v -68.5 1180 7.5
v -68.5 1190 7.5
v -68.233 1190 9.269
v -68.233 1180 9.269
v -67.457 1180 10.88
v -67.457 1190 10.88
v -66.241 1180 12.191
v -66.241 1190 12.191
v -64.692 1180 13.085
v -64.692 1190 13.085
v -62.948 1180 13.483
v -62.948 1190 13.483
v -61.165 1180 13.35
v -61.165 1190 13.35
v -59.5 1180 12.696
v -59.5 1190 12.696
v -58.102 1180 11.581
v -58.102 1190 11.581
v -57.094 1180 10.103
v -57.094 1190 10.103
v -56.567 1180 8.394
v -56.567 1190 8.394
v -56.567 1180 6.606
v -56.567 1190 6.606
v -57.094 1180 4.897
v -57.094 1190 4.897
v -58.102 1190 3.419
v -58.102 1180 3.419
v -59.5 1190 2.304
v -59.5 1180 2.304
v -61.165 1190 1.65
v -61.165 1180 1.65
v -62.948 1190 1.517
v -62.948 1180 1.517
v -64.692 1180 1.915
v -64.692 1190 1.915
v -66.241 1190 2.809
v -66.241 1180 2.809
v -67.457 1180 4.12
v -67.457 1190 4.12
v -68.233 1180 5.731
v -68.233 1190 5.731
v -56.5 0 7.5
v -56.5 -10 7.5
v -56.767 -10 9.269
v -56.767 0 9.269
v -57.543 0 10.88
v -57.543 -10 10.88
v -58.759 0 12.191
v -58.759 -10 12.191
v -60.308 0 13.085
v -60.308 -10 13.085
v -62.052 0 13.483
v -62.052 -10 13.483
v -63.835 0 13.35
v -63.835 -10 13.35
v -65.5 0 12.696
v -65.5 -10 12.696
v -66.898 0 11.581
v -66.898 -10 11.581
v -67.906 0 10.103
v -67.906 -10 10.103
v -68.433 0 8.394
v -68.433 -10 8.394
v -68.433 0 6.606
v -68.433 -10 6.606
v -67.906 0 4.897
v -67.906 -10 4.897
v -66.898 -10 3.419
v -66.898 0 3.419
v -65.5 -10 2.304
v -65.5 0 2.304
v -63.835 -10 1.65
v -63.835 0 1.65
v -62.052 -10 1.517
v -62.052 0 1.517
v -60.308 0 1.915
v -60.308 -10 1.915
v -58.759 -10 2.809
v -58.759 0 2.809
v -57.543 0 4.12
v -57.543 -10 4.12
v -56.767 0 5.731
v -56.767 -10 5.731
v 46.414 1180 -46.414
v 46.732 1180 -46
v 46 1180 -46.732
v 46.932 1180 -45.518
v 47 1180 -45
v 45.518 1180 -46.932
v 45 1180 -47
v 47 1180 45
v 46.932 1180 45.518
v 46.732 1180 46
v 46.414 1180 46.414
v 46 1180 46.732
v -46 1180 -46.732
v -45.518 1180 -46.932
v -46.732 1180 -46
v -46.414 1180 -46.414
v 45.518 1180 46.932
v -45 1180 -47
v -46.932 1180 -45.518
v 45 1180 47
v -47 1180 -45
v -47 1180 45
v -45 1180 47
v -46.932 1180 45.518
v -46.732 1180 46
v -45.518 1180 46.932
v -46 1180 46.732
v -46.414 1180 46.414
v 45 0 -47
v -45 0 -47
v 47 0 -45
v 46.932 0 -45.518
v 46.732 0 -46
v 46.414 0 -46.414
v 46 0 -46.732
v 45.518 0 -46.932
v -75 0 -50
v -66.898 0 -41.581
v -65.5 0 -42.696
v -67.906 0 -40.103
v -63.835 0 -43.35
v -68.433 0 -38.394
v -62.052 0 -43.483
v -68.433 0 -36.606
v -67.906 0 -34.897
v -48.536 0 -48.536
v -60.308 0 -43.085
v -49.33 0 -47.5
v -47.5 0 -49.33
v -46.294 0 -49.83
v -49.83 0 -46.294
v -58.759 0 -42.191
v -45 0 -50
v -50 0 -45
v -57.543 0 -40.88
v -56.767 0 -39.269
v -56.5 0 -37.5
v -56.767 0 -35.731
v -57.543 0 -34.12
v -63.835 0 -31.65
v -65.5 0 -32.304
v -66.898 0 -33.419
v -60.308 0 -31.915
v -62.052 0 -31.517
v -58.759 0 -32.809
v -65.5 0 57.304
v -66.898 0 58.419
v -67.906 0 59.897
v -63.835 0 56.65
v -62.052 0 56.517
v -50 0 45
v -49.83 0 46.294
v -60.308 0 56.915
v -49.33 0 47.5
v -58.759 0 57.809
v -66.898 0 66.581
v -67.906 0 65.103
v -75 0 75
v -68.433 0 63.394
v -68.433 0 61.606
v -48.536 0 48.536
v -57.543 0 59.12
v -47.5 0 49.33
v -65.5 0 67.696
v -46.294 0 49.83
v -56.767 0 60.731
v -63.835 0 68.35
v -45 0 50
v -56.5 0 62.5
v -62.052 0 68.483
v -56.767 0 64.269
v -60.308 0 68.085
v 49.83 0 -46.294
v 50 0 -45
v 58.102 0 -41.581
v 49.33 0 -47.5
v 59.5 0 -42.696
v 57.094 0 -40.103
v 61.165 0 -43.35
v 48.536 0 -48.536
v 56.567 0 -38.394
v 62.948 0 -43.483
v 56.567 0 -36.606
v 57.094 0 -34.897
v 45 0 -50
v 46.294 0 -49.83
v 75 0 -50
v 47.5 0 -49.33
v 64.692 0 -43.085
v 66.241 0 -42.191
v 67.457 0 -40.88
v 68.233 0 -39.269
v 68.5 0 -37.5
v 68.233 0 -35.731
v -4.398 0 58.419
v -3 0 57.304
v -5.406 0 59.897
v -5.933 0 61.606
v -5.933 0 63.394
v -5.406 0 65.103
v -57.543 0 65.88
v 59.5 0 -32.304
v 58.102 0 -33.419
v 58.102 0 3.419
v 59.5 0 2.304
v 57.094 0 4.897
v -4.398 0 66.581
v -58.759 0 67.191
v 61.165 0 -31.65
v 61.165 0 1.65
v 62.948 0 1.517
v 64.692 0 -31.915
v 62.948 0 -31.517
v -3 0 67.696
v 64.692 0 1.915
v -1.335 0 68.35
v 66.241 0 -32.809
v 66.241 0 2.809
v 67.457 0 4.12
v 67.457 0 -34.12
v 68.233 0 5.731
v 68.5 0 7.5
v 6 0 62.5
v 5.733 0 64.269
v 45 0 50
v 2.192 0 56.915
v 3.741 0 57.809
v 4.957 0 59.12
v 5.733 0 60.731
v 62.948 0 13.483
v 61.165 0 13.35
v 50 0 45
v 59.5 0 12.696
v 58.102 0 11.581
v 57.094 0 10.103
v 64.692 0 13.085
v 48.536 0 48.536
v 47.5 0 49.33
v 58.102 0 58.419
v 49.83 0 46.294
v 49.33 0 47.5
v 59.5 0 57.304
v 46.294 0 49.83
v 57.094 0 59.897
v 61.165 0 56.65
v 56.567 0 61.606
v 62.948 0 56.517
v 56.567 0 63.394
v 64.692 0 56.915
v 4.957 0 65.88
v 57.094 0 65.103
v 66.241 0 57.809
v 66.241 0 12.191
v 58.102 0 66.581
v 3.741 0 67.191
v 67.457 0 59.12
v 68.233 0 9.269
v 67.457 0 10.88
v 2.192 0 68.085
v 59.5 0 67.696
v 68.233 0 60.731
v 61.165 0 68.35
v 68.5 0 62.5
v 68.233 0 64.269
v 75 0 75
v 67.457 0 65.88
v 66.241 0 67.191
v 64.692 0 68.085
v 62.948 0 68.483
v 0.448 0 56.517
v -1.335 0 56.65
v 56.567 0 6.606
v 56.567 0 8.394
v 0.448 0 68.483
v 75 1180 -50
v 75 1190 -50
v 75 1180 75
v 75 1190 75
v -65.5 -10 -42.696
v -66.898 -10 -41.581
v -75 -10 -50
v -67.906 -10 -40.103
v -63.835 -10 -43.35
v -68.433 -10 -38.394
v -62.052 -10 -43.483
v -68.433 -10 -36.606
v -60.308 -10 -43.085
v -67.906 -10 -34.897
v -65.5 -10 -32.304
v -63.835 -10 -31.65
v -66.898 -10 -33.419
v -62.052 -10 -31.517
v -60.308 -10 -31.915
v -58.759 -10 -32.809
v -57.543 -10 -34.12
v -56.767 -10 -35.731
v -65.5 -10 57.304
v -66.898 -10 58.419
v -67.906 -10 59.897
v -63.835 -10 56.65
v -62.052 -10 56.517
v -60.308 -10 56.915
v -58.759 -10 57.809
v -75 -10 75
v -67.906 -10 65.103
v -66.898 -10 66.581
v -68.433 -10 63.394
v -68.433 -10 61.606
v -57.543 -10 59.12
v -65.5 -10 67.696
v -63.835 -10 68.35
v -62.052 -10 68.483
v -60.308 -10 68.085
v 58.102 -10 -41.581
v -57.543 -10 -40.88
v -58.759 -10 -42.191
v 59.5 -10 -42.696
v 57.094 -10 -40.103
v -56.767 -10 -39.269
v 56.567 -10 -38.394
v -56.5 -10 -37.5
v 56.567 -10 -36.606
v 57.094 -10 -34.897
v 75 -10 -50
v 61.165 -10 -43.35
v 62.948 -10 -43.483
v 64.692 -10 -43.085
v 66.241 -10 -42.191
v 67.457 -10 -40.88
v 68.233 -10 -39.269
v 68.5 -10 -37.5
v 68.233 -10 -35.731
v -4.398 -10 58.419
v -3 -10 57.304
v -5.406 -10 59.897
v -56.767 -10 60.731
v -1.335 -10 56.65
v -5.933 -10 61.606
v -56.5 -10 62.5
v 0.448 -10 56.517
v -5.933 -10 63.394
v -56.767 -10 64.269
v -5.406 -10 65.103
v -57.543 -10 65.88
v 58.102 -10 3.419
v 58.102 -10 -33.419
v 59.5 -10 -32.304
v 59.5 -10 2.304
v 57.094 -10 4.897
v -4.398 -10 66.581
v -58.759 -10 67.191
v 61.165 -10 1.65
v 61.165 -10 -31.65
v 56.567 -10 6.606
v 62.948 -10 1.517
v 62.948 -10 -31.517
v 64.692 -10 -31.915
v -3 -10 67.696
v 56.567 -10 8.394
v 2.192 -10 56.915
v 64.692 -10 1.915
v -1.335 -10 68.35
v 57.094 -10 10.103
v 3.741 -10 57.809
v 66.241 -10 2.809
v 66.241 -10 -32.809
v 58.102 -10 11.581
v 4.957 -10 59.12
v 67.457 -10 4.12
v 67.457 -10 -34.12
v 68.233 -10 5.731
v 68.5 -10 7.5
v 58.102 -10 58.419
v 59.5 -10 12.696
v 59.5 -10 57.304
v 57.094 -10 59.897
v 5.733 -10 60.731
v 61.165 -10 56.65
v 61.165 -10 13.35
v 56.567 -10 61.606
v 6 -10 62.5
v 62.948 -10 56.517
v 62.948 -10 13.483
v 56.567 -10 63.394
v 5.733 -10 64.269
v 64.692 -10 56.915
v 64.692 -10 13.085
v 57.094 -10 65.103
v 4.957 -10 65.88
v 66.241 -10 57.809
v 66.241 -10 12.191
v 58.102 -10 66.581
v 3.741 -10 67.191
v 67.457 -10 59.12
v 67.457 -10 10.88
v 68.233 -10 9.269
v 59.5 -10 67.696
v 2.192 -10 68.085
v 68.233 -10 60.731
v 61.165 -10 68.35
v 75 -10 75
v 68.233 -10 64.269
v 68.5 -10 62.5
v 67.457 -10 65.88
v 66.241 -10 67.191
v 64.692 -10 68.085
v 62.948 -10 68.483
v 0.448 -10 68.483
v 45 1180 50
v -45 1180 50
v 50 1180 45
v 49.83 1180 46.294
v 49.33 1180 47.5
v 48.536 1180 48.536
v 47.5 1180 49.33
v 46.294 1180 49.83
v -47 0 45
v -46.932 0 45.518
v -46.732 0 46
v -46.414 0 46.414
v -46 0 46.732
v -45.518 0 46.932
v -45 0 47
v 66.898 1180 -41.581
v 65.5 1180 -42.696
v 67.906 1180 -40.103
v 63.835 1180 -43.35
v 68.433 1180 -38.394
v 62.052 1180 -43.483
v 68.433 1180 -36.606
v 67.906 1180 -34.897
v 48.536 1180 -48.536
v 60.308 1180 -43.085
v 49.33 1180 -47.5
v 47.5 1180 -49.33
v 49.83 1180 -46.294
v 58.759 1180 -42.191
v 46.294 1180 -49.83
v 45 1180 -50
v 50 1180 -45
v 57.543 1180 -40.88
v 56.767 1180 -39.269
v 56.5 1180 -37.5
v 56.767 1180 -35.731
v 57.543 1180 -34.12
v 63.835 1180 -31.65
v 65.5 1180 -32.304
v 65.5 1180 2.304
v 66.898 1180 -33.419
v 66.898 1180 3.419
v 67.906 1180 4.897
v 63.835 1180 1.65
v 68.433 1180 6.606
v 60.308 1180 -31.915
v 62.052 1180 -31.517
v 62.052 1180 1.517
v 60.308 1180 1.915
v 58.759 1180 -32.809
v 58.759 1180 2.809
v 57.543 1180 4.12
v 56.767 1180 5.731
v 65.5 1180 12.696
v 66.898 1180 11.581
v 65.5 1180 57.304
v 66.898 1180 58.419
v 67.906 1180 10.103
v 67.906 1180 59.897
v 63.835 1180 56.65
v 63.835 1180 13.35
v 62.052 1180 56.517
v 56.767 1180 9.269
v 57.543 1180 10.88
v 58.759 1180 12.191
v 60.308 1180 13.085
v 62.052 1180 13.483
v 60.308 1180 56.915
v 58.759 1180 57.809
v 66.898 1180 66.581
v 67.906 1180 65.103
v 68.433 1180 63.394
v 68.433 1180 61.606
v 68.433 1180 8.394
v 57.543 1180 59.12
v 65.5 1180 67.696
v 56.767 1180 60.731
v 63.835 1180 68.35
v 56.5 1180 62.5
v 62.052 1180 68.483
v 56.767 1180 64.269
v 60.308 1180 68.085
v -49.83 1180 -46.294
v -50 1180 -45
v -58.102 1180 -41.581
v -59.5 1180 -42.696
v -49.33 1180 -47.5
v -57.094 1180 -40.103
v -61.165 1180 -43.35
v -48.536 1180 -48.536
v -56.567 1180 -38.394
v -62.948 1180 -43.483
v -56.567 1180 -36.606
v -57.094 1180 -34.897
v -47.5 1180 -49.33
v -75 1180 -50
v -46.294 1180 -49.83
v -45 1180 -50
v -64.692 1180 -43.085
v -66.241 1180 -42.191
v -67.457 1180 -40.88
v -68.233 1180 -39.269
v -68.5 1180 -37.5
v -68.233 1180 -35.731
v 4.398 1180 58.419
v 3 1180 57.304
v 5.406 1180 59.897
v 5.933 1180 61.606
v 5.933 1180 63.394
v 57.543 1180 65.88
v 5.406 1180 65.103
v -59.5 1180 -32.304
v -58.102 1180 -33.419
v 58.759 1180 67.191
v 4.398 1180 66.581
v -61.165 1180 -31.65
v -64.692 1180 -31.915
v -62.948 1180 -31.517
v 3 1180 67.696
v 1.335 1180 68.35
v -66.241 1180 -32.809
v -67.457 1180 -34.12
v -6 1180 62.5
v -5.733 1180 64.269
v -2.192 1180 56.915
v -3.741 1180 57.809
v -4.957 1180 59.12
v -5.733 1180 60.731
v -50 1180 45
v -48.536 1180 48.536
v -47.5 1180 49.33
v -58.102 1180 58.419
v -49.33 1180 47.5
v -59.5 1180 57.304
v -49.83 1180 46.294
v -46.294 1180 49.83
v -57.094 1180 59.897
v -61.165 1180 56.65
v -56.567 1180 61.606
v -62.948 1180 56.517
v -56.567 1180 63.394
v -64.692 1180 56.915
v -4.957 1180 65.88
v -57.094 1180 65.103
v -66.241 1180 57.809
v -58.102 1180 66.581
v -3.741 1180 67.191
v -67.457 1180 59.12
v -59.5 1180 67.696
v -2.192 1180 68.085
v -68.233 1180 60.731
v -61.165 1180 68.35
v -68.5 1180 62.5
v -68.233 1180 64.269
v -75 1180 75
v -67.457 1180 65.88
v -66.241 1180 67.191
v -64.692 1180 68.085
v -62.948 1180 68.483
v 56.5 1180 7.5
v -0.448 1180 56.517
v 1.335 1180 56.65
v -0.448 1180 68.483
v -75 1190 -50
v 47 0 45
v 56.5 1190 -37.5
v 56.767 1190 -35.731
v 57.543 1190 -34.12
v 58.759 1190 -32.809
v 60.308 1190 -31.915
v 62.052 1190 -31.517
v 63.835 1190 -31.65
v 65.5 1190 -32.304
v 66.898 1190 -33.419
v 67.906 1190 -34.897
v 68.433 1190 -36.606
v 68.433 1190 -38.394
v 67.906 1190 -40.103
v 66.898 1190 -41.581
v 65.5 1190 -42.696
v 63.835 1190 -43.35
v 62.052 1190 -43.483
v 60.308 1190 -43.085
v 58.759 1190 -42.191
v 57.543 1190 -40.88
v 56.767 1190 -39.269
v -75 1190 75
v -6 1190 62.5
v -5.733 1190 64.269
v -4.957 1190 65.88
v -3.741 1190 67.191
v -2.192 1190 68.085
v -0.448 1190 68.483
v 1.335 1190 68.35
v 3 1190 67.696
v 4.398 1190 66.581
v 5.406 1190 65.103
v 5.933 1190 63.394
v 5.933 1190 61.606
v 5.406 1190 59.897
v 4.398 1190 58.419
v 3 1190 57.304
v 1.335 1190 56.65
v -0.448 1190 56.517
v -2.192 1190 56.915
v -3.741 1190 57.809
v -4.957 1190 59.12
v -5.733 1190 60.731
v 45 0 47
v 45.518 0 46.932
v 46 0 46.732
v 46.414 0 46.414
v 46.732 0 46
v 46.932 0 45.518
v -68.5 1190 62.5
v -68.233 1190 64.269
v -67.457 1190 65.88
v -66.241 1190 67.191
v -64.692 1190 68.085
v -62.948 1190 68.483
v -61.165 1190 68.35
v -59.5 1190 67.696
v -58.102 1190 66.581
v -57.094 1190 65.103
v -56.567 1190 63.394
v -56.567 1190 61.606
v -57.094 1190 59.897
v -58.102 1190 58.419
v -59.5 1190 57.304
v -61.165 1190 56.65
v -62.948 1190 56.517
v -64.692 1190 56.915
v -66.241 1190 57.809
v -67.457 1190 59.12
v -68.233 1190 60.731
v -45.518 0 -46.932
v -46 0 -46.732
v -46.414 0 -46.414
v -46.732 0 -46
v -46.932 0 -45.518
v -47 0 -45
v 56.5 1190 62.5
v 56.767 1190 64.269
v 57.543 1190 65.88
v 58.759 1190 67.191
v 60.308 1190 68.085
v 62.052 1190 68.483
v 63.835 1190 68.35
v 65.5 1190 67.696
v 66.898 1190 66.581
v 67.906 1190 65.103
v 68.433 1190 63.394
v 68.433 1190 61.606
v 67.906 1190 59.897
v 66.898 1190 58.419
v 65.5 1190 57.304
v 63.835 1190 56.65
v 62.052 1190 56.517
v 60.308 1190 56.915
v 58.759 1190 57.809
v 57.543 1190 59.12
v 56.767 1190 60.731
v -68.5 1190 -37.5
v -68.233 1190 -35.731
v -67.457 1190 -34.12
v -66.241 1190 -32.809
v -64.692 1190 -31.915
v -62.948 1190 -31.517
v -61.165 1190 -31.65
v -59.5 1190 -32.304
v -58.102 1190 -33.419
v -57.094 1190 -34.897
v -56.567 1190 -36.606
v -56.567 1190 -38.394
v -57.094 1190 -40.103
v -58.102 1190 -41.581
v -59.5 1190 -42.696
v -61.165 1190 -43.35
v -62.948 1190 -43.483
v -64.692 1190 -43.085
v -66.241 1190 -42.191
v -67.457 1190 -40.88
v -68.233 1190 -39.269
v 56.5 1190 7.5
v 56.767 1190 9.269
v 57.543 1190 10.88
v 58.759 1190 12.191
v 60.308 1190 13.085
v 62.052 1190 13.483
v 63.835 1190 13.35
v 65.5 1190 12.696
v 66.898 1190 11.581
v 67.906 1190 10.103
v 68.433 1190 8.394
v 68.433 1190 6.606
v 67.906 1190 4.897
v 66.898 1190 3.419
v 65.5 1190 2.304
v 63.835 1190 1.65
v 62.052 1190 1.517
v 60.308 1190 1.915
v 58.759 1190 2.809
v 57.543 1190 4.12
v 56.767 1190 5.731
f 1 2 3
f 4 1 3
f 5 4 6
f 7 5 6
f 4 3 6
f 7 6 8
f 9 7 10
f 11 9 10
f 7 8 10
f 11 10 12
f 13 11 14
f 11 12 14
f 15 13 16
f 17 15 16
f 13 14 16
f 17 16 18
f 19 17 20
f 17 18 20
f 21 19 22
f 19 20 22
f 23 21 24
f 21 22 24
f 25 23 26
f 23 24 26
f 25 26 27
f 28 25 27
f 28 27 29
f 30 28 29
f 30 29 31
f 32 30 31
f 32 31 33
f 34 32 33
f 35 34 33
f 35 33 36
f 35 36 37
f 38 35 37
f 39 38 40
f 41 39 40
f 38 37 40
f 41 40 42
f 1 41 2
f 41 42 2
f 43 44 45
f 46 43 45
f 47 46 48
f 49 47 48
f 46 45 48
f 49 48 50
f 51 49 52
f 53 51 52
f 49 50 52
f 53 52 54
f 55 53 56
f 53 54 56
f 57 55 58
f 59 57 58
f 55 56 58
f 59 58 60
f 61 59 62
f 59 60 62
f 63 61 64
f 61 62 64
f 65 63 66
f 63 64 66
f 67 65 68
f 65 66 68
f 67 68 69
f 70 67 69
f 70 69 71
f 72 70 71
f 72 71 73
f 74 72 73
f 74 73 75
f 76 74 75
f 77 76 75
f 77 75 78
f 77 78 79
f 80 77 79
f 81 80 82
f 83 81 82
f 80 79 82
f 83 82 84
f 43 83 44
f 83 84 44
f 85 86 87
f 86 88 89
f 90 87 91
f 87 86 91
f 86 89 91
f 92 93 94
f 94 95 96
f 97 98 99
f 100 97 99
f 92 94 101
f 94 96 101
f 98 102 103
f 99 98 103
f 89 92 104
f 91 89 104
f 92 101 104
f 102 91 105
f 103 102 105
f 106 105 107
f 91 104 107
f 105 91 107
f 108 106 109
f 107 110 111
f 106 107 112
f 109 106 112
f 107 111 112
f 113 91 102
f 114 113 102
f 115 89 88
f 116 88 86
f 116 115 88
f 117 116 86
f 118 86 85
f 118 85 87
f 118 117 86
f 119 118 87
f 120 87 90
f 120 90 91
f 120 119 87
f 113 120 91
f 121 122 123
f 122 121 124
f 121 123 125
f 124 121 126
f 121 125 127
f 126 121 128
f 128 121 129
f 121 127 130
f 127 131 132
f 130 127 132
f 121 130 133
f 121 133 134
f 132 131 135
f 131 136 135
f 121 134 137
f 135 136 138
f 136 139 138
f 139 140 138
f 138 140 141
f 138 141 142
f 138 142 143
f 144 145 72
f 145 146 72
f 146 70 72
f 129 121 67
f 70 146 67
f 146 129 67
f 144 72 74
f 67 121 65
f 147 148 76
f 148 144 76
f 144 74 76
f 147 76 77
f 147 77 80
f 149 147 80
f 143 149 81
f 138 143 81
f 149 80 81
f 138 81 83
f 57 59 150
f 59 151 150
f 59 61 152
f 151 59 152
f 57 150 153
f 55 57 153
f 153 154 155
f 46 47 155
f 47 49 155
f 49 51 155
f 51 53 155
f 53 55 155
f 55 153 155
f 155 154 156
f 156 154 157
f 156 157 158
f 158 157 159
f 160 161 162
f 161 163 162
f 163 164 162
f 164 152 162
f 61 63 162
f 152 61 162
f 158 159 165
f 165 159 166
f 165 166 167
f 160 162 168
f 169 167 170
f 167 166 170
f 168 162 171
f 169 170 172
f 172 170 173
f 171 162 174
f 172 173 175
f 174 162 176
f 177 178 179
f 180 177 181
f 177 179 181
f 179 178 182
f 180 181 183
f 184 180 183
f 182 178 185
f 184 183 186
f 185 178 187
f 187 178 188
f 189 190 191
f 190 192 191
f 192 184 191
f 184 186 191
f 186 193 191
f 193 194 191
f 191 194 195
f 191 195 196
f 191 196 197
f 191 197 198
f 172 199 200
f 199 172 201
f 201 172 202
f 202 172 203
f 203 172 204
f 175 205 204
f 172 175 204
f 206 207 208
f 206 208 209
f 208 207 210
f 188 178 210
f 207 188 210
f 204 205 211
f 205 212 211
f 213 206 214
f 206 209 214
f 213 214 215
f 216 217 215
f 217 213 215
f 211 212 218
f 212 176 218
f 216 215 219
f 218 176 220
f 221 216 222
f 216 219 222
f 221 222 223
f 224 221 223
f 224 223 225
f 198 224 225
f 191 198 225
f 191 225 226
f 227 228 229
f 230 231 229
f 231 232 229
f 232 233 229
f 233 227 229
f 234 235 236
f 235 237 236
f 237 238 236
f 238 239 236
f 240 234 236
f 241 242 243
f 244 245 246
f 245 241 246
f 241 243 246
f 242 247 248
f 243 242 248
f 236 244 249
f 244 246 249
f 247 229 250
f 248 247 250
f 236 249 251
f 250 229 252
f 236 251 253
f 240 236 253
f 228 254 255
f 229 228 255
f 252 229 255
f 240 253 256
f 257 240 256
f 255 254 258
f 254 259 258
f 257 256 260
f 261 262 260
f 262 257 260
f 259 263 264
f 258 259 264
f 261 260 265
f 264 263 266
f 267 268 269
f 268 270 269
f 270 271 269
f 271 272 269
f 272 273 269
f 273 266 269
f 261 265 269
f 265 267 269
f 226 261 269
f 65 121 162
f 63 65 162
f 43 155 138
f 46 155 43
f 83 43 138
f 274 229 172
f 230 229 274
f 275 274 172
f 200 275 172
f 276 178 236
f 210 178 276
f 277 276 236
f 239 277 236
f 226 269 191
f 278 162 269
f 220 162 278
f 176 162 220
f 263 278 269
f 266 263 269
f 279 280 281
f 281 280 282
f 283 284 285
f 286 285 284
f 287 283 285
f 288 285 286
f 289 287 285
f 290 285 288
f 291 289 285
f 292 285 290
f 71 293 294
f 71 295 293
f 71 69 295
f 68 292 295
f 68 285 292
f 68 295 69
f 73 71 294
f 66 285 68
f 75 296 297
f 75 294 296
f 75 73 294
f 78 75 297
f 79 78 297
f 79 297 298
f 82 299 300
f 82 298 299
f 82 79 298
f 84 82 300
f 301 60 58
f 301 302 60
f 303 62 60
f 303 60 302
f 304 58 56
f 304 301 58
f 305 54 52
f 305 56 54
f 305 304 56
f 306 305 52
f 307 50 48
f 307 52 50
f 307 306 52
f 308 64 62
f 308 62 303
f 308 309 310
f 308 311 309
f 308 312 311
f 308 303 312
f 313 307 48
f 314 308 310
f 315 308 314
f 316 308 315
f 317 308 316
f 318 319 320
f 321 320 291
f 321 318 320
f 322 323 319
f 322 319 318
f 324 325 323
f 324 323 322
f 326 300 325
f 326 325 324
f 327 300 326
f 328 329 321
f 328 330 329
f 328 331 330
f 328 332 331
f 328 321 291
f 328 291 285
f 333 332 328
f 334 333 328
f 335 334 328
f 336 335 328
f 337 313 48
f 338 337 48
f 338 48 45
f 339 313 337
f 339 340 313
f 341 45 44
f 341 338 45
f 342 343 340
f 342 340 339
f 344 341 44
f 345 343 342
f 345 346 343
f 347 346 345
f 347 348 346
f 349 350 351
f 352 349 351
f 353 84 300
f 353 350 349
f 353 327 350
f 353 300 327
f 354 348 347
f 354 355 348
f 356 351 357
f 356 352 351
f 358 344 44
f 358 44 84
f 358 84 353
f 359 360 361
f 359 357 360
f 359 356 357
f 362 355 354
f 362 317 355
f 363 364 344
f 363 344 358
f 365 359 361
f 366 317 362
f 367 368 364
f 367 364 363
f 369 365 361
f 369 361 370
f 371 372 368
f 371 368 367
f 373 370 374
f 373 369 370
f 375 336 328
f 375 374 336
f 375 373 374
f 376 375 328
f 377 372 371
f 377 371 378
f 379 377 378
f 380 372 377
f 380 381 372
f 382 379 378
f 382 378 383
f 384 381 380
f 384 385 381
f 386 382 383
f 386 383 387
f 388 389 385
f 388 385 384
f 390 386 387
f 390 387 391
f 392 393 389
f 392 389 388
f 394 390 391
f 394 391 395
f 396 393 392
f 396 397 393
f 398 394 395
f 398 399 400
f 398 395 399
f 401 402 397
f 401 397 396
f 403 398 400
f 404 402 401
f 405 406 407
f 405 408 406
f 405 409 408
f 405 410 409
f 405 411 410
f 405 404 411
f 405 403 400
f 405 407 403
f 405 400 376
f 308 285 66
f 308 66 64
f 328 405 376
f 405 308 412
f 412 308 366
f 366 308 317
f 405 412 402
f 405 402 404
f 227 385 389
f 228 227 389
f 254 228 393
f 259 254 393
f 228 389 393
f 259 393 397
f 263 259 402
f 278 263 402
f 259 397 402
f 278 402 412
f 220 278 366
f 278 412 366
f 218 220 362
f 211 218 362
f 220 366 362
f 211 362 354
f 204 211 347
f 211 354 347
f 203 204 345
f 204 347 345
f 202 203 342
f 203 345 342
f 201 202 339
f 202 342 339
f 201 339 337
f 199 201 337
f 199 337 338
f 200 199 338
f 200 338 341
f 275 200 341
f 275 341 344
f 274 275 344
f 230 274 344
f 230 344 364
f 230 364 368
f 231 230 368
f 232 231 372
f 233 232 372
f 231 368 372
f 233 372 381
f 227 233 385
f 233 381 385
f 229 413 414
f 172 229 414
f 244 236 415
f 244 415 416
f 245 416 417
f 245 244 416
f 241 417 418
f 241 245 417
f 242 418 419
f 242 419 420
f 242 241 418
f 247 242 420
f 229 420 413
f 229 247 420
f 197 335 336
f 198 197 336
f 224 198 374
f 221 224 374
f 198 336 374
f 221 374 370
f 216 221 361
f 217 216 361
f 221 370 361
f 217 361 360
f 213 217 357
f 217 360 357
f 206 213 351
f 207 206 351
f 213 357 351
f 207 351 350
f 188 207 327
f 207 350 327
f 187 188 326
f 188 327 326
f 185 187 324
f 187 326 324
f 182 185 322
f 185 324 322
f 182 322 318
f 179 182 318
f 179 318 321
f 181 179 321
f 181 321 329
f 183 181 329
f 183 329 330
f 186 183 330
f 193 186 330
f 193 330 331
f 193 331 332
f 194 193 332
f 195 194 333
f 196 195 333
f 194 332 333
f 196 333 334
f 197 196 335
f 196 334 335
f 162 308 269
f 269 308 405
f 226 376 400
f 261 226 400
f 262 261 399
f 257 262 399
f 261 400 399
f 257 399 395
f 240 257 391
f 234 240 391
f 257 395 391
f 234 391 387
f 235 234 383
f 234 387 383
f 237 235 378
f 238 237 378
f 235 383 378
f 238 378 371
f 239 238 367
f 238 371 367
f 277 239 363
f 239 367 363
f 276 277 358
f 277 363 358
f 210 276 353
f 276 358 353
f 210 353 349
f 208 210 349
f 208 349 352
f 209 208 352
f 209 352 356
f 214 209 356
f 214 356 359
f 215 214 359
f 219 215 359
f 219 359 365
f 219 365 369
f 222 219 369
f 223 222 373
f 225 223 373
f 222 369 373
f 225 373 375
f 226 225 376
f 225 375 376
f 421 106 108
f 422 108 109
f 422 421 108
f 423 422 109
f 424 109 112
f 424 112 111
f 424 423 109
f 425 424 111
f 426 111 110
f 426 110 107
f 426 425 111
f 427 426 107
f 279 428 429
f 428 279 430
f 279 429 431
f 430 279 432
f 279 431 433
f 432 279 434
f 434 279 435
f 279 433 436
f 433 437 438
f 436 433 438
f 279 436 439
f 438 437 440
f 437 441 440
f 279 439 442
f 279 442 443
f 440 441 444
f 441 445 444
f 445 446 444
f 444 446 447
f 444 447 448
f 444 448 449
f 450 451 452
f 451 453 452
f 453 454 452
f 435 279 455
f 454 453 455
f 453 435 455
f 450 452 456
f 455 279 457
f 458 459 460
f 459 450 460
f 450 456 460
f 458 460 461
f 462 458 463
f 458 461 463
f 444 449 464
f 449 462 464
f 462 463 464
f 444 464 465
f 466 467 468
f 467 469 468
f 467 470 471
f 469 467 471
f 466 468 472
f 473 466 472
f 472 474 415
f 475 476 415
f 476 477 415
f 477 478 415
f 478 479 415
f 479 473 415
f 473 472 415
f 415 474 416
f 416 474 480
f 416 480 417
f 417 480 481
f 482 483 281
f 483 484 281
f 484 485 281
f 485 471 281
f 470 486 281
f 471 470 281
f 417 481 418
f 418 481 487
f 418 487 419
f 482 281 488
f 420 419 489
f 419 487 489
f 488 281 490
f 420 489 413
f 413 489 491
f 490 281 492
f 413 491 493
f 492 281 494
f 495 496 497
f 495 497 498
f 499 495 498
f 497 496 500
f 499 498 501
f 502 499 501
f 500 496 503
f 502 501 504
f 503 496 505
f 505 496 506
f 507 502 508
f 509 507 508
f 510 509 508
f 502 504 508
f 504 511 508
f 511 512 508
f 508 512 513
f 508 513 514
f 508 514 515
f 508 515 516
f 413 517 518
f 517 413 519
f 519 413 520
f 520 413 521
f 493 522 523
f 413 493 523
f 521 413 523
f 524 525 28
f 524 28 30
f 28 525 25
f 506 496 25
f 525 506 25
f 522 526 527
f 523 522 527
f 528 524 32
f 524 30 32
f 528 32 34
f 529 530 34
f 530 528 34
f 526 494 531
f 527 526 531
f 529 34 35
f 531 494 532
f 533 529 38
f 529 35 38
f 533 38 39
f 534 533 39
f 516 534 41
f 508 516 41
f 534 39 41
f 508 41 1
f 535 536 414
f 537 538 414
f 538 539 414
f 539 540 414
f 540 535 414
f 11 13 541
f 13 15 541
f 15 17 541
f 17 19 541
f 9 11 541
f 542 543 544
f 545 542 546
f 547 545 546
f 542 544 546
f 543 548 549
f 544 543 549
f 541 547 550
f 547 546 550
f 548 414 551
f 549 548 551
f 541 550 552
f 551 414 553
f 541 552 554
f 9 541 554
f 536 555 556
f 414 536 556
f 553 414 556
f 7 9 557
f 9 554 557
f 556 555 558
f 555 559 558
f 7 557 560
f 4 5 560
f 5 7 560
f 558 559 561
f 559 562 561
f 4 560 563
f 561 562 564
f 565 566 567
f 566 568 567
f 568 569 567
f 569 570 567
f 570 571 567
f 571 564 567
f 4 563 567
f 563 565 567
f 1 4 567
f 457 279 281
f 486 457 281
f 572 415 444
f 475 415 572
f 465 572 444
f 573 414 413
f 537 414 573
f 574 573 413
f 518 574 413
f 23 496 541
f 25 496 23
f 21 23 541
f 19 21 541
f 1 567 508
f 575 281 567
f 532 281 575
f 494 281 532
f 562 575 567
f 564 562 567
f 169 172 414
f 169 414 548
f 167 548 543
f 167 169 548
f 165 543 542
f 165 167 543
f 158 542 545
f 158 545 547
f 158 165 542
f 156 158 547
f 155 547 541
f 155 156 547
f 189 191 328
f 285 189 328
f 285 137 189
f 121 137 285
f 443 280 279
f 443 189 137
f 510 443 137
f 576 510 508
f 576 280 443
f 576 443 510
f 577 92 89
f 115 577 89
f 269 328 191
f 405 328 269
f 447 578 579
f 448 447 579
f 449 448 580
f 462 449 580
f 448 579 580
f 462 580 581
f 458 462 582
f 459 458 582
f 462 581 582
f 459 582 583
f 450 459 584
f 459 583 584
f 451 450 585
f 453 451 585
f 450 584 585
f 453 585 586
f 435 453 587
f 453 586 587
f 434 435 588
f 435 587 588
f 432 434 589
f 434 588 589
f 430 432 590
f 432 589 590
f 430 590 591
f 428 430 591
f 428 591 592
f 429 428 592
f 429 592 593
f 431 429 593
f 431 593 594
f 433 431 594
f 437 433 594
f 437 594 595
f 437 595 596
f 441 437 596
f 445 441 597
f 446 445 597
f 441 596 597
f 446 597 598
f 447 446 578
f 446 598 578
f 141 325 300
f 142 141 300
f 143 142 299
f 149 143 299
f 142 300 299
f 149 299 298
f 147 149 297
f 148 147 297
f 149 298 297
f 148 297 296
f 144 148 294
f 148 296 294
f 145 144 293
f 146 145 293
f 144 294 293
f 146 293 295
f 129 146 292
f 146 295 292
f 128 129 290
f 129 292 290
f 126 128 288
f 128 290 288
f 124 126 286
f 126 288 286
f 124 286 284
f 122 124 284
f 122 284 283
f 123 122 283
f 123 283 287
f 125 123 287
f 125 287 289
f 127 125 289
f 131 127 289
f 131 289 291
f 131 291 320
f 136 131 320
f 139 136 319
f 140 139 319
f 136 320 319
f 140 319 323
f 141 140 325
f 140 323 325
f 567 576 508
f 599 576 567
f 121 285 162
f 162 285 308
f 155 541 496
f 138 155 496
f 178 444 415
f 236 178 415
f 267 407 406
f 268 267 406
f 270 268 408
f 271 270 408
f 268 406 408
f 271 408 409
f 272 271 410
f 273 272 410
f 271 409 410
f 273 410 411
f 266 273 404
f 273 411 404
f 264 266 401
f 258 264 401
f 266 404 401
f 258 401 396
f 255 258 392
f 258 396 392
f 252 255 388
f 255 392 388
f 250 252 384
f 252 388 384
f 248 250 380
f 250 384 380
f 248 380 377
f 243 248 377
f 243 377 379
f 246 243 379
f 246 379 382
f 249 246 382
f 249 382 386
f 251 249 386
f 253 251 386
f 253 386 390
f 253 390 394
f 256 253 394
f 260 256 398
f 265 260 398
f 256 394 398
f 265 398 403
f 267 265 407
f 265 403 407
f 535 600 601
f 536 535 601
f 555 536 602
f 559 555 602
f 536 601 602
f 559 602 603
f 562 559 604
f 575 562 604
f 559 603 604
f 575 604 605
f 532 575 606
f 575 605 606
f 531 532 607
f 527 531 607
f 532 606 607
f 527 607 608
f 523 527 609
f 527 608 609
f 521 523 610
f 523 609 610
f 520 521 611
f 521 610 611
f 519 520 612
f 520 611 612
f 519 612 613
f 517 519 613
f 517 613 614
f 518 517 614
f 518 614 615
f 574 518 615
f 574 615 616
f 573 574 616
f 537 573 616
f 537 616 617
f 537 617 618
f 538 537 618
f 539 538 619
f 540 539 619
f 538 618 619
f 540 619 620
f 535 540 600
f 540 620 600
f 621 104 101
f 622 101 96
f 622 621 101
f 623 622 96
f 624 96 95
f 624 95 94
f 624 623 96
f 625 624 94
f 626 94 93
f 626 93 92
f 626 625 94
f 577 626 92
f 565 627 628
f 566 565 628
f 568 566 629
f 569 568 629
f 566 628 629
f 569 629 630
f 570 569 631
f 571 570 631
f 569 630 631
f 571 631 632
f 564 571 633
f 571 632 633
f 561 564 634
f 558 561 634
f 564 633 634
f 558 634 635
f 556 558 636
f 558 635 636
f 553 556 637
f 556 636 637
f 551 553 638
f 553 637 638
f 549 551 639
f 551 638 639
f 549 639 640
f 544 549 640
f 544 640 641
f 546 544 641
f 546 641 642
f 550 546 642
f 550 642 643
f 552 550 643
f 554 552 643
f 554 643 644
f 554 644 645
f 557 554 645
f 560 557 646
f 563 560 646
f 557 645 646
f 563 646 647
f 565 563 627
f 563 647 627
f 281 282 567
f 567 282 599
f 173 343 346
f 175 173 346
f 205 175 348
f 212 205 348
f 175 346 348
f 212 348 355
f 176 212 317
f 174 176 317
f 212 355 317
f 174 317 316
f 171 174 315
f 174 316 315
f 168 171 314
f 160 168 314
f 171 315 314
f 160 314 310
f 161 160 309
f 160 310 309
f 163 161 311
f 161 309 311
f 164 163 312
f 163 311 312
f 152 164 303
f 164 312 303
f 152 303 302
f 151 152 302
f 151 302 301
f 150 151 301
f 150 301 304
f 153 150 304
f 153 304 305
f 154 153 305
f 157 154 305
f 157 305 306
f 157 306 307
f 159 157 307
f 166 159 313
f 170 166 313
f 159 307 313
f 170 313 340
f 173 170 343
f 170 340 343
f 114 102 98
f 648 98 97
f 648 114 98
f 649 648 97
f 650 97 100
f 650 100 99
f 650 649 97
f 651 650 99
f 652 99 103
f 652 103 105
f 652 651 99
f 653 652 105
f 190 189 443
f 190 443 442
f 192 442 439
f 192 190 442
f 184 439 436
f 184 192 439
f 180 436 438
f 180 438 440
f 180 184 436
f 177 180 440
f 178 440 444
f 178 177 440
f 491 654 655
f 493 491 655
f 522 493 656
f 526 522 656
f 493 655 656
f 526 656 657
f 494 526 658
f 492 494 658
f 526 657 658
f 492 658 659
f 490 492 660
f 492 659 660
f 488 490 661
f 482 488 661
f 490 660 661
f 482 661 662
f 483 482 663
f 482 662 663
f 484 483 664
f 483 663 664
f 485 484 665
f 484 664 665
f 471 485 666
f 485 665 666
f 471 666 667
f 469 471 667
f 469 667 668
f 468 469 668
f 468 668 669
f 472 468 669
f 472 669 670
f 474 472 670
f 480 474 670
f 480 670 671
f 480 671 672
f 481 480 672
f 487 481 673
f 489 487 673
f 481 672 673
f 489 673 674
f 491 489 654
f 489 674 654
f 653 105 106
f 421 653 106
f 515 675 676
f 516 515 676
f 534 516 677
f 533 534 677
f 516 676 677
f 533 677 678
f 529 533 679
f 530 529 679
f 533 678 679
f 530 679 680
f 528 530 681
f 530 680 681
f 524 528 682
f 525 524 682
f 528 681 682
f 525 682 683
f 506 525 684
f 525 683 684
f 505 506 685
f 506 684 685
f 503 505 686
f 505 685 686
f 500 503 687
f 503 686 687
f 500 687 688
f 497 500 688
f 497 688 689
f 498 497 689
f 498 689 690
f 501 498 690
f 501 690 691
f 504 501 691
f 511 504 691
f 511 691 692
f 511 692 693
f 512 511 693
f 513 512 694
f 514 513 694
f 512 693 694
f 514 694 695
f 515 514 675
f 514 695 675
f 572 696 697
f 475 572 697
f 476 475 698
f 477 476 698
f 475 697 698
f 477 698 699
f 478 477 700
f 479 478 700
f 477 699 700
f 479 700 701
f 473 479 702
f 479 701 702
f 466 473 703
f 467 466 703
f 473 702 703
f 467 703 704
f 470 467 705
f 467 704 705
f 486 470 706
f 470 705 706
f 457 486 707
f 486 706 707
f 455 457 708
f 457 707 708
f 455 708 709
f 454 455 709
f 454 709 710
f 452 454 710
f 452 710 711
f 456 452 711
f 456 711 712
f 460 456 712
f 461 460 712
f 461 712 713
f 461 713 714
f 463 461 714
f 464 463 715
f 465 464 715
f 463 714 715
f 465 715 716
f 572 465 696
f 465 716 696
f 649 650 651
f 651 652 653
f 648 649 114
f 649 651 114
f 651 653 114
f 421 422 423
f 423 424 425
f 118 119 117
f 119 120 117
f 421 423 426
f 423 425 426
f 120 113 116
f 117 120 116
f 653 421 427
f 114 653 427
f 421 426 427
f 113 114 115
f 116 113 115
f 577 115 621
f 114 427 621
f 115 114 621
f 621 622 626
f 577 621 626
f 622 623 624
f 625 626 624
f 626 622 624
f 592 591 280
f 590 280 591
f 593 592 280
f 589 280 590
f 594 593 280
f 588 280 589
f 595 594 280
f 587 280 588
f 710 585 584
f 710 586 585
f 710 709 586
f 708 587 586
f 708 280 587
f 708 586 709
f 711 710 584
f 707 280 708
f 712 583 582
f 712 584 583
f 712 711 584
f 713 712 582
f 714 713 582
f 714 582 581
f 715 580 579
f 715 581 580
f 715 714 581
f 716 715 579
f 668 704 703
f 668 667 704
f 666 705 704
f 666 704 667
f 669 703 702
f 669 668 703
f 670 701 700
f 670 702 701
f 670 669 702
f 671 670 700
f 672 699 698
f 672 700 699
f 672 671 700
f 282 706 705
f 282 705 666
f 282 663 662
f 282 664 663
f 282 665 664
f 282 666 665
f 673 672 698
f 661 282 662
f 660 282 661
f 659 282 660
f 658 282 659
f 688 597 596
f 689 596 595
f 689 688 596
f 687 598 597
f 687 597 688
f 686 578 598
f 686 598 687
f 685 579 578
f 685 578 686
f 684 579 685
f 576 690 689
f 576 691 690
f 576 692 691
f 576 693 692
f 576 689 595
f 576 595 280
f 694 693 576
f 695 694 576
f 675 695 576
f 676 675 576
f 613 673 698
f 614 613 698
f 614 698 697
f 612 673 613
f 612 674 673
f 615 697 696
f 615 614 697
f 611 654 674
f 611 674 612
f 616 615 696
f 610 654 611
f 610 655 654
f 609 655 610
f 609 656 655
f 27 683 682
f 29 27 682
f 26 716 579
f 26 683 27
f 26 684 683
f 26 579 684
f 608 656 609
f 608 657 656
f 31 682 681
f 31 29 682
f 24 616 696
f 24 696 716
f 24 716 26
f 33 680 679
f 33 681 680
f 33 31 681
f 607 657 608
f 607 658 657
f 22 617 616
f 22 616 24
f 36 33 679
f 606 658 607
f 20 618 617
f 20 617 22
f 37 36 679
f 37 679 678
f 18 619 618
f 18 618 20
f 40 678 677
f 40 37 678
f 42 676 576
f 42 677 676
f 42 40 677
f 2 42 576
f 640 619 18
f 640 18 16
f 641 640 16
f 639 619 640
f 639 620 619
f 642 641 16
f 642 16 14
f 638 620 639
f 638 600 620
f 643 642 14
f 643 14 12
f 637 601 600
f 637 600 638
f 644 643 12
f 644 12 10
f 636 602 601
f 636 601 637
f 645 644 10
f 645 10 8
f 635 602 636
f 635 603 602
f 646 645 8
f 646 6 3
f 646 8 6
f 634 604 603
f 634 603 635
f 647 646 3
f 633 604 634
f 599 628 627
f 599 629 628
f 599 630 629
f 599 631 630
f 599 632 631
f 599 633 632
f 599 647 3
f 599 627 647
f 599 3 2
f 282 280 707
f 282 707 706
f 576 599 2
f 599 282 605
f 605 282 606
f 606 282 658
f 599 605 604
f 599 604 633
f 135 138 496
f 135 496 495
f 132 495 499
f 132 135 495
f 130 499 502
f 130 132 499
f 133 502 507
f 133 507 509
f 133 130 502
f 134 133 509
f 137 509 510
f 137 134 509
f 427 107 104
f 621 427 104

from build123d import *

# Parameters (mm, degrees)
F1_DEPTH = 1180
F3_W     = 150
F3_H     = 125
F3_R     = 6
F4_DEPTH = 10
F7_W     = 150
F7_H     = 125
F7_R     = 6
F8_DEPTH = 10


with BuildPart() as f1:
    # F0 (on Front) → F1 (new body)
    with BuildSketch(Plane.XZ):
        with BuildLine():
            ThreePointArc((50, 45), (48.5355339059, 48.5355339059), (45, 50))
            Line((45, 50), (-45, 50))
            ThreePointArc((-45, 50), (-48.5355339059, 48.5355339059), (-50, 45))
            Line((-50, 45), (-50, -45))
            ThreePointArc((-50, -45), (-48.5355339059, -48.5355339059), (-45, -50))
            Line((-45, -50), (45, -50))
            ThreePointArc((45, -50), (48.5355339059, -48.5355339059), (50, -45))
            Line((50, -45), (50, 45))
        make_face()
        with BuildLine():
            ThreePointArc((-47, 45), (-46.4142135624, 46.4142135624), (-45, 47))
            Line((-45, 47), (45, 47))
            ThreePointArc((45, 47), (46.4142135624, 46.4142135624), (47, 45))
            Line((47, 45), (47, -45))
            ThreePointArc((47, -45), (46.4142135624, -46.4142135624), (45, -47))
            Line((45, -47), (-45, -47))
            ThreePointArc((-45, -47), (-46.4142135624, -46.4142135624), (-47, -45))
            Line((-47, -45), (-47, 45))
        make_face(mode=Mode.SUBTRACT)
    extrude(amount=-F1_DEPTH)


with BuildPart() as f4:
    # F3 (on offset) → F4 (new body)
    with BuildSketch(Plane.XZ.offset(10)):
        with Locations((0, 12.5)):
            Rectangle(F3_W, F3_H)
        with Locations((-62.5, -37.5)):
            Circle(F3_R, mode=Mode.SUBTRACT)
        with Locations((-62.5, 7.5)):
            Circle(F3_R, mode=Mode.SUBTRACT)
        with Locations((62.5, -37.5)):
            Circle(F3_R, mode=Mode.SUBTRACT)
        with Locations((62.5, 7.5)):
            Circle(F3_R, mode=Mode.SUBTRACT)
        with Locations((-62.5, 62.5)):
            Circle(F3_R, mode=Mode.SUBTRACT)
        with Locations((0, 62.5)):
            Circle(F3_R, mode=Mode.SUBTRACT)
        with Locations((62.5, 62.5)):
            Circle(F3_R, mode=Mode.SUBTRACT)
    extrude(amount=-F4_DEPTH)


with BuildPart() as f1_1:
    add(f1.part)

    # F5: union F4
    add(f4.part)

    # F7 (on offset) → F8 (join)
    with BuildSketch(Plane(origin=(0, 1190, 0), x_dir=(-1, 0, 0), z_dir=(0, 1, 0))):
        with Locations((0, 12.5)):
            Rectangle(F7_W, F7_H)
        with Locations((-62.5, -37.5)):
            Circle(F7_R, mode=Mode.SUBTRACT)
        with Locations((-62.5, 7.5)):
            Circle(F7_R, mode=Mode.SUBTRACT)
        with Locations((62.5, -37.5)):
            Circle(F7_R, mode=Mode.SUBTRACT)
        with Locations((62.5, 7.5)):
            Circle(F7_R, mode=Mode.SUBTRACT)
        with Locations((-62.5, 62.5)):
            Circle(F7_R, mode=Mode.SUBTRACT)
        with Locations((0, 62.5)):
            Circle(F7_R, mode=Mode.SUBTRACT)
        with Locations((62.5, 62.5)):
            Circle(F7_R, mode=Mode.SUBTRACT)
    extrude(amount=-F8_DEPTH)


solid = f1_1.part
